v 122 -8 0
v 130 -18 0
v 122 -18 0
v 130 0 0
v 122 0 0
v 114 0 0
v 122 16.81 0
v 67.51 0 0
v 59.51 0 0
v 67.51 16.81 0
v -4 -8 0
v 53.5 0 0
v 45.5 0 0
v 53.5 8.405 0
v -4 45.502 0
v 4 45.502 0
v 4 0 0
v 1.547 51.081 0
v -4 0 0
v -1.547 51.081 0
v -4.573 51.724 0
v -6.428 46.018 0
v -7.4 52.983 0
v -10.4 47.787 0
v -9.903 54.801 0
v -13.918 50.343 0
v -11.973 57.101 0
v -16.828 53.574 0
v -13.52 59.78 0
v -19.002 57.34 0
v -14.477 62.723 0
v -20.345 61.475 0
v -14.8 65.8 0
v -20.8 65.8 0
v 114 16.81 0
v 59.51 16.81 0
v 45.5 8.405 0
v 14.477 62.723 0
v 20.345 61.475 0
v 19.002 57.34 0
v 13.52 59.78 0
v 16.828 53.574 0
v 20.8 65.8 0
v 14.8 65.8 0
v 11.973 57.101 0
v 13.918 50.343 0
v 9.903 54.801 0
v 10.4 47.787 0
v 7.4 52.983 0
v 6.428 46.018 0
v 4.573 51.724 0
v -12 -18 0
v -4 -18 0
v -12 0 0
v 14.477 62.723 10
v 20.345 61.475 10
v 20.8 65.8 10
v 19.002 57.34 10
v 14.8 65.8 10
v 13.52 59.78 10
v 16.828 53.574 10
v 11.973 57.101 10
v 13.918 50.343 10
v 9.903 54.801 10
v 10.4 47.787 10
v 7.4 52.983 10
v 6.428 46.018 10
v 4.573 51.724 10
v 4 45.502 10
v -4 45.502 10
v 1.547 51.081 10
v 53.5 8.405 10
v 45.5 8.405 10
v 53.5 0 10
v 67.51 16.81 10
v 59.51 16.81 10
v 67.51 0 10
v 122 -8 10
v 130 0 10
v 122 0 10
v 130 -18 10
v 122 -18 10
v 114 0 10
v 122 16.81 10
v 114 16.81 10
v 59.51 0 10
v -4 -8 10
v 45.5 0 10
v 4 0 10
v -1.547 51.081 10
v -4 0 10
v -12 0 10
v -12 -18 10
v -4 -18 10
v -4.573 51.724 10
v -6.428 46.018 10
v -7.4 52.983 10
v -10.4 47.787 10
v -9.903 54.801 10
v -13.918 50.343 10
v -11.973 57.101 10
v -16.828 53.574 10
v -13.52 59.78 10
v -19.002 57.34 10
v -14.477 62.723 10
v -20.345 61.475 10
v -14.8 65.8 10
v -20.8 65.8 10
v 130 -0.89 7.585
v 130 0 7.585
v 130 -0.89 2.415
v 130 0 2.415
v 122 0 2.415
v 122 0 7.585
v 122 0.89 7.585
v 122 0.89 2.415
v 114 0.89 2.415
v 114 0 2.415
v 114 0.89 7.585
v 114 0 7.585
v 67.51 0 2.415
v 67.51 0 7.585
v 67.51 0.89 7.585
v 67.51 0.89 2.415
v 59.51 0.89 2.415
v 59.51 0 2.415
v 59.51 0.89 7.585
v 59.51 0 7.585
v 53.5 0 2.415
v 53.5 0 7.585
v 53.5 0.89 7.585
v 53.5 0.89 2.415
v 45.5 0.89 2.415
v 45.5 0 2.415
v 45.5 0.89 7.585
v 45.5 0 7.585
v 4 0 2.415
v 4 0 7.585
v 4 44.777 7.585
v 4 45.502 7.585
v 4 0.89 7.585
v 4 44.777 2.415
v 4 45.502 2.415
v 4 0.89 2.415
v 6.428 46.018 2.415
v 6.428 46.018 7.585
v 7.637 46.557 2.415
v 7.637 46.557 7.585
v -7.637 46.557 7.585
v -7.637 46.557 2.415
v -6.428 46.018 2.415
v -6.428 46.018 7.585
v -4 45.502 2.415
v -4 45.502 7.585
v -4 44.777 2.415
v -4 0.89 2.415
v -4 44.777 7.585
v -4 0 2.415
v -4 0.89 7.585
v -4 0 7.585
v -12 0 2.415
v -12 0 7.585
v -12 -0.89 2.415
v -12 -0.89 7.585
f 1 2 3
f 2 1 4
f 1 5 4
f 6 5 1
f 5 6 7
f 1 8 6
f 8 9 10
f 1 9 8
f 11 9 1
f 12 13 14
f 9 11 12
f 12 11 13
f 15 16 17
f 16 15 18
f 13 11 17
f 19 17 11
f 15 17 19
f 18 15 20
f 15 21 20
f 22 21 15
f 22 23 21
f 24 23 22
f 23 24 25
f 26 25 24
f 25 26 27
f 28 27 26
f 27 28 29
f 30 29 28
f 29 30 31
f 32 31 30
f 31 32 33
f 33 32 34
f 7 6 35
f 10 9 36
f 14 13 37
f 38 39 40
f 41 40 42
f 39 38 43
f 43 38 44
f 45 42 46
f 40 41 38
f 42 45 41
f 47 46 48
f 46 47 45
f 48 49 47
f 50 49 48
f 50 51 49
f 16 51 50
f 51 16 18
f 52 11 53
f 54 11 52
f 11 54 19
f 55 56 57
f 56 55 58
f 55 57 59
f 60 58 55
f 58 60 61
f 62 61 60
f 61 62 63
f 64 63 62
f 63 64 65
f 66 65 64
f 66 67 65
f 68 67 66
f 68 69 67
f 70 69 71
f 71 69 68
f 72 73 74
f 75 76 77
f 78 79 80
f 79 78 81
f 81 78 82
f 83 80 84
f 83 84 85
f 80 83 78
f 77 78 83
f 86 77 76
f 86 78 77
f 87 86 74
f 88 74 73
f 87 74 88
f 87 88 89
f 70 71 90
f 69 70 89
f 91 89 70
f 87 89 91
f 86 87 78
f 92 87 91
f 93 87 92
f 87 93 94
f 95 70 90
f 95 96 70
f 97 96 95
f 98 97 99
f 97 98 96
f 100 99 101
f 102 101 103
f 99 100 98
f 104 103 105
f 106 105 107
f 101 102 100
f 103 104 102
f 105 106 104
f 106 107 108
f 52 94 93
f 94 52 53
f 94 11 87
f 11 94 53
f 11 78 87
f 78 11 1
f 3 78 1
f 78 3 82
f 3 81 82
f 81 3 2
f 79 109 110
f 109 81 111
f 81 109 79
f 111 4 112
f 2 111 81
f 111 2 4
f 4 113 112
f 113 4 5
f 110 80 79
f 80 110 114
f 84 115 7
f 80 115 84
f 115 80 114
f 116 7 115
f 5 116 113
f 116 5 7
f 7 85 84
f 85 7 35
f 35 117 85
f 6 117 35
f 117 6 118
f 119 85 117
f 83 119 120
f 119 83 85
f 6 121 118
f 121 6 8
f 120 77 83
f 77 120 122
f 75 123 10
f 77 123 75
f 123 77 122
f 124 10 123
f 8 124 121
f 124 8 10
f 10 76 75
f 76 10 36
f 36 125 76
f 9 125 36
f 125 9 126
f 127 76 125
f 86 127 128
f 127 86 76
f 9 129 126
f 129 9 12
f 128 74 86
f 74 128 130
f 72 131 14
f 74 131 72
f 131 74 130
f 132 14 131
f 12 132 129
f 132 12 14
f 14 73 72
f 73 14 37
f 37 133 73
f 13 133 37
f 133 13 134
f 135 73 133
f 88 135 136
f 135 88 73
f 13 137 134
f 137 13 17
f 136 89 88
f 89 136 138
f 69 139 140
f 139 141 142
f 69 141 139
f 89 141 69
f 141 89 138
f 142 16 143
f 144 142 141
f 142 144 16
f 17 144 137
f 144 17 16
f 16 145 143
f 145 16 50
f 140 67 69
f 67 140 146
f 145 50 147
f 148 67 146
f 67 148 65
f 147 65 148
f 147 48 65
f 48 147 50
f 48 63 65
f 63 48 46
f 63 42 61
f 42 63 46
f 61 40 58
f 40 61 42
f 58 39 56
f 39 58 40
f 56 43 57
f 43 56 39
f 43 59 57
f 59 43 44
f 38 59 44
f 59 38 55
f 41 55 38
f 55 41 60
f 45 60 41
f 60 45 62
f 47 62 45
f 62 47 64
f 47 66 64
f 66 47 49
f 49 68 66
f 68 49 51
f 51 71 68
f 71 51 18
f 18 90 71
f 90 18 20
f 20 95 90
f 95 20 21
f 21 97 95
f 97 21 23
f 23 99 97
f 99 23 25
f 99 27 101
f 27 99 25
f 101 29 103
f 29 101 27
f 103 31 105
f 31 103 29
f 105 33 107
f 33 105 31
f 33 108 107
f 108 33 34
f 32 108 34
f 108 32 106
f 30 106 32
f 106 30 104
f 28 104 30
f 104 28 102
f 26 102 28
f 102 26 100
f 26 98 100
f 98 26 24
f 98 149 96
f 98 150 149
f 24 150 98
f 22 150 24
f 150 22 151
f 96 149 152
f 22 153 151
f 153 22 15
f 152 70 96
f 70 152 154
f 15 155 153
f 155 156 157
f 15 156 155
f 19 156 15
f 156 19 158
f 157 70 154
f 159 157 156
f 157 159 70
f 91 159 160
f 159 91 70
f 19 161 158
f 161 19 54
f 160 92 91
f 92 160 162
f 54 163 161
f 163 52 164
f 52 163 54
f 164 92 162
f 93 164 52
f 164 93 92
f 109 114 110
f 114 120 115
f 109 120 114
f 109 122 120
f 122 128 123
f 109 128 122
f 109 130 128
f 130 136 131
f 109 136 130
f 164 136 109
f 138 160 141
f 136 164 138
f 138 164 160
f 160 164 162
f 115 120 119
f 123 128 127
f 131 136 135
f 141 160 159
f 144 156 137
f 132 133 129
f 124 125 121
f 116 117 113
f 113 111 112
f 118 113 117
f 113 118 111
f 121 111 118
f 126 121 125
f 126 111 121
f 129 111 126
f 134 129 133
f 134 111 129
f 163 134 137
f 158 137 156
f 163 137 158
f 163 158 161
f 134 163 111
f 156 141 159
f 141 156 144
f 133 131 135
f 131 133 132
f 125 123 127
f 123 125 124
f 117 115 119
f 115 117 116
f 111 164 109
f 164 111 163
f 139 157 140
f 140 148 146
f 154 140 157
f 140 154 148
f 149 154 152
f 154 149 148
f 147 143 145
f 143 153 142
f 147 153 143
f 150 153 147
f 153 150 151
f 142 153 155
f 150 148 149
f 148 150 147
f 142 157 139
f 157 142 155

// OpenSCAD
width = 125.5+0.5;
support_size = 8;
edge_height = 10;
lip_depth = 16.81;
lip_width = 5.51+0.5;
bar_diameter = 29.1+0.5;
bar_distance = 53.5;
bar_down_from_lip = 51;
extrude_size = 10;

zip_tie_height = 1.28+0.5;
zip_tie_width = 4.67+0.5;

module pattern() {
translate([-support_size*1.5, -support_size-edge_height])
difference() {
  square([width+support_size*2, edge_height+support_size]);
  translate([support_size, 0])
    square([width, edge_height]);
}

translate([width-support_size*1.5, 0])
square([support_size, lip_depth]);

translate([bar_distance-support_size, 0])
{
square([support_size, lip_depth*0.5]);
translate([support_size+lip_width, 0])
square([support_size, lip_depth]);
}


  translate([-support_size/2, 0])
  square([support_size, bar_down_from_lip]);

  translate([0, bar_diameter/2+bar_down_from_lip])
  difference() {
    circle(d=bar_diameter+support_size*1.5);
    circle(d=bar_diameter);
    translate([-(bar_diameter+support_size*2)/2, 0])
      square(bar_diameter+support_size*2);
}
}

module zip_tie() {
  translate([0,0,extrude_size/2])
  cube([1000, zip_tie_height, zip_tie_width], center=true);
}


difference() {
linear_extrude(extrude_size)
pattern();
  zip_tie();
  translate([0, bar_down_from_lip-support_size/1.5])
  zip_tie();

}
